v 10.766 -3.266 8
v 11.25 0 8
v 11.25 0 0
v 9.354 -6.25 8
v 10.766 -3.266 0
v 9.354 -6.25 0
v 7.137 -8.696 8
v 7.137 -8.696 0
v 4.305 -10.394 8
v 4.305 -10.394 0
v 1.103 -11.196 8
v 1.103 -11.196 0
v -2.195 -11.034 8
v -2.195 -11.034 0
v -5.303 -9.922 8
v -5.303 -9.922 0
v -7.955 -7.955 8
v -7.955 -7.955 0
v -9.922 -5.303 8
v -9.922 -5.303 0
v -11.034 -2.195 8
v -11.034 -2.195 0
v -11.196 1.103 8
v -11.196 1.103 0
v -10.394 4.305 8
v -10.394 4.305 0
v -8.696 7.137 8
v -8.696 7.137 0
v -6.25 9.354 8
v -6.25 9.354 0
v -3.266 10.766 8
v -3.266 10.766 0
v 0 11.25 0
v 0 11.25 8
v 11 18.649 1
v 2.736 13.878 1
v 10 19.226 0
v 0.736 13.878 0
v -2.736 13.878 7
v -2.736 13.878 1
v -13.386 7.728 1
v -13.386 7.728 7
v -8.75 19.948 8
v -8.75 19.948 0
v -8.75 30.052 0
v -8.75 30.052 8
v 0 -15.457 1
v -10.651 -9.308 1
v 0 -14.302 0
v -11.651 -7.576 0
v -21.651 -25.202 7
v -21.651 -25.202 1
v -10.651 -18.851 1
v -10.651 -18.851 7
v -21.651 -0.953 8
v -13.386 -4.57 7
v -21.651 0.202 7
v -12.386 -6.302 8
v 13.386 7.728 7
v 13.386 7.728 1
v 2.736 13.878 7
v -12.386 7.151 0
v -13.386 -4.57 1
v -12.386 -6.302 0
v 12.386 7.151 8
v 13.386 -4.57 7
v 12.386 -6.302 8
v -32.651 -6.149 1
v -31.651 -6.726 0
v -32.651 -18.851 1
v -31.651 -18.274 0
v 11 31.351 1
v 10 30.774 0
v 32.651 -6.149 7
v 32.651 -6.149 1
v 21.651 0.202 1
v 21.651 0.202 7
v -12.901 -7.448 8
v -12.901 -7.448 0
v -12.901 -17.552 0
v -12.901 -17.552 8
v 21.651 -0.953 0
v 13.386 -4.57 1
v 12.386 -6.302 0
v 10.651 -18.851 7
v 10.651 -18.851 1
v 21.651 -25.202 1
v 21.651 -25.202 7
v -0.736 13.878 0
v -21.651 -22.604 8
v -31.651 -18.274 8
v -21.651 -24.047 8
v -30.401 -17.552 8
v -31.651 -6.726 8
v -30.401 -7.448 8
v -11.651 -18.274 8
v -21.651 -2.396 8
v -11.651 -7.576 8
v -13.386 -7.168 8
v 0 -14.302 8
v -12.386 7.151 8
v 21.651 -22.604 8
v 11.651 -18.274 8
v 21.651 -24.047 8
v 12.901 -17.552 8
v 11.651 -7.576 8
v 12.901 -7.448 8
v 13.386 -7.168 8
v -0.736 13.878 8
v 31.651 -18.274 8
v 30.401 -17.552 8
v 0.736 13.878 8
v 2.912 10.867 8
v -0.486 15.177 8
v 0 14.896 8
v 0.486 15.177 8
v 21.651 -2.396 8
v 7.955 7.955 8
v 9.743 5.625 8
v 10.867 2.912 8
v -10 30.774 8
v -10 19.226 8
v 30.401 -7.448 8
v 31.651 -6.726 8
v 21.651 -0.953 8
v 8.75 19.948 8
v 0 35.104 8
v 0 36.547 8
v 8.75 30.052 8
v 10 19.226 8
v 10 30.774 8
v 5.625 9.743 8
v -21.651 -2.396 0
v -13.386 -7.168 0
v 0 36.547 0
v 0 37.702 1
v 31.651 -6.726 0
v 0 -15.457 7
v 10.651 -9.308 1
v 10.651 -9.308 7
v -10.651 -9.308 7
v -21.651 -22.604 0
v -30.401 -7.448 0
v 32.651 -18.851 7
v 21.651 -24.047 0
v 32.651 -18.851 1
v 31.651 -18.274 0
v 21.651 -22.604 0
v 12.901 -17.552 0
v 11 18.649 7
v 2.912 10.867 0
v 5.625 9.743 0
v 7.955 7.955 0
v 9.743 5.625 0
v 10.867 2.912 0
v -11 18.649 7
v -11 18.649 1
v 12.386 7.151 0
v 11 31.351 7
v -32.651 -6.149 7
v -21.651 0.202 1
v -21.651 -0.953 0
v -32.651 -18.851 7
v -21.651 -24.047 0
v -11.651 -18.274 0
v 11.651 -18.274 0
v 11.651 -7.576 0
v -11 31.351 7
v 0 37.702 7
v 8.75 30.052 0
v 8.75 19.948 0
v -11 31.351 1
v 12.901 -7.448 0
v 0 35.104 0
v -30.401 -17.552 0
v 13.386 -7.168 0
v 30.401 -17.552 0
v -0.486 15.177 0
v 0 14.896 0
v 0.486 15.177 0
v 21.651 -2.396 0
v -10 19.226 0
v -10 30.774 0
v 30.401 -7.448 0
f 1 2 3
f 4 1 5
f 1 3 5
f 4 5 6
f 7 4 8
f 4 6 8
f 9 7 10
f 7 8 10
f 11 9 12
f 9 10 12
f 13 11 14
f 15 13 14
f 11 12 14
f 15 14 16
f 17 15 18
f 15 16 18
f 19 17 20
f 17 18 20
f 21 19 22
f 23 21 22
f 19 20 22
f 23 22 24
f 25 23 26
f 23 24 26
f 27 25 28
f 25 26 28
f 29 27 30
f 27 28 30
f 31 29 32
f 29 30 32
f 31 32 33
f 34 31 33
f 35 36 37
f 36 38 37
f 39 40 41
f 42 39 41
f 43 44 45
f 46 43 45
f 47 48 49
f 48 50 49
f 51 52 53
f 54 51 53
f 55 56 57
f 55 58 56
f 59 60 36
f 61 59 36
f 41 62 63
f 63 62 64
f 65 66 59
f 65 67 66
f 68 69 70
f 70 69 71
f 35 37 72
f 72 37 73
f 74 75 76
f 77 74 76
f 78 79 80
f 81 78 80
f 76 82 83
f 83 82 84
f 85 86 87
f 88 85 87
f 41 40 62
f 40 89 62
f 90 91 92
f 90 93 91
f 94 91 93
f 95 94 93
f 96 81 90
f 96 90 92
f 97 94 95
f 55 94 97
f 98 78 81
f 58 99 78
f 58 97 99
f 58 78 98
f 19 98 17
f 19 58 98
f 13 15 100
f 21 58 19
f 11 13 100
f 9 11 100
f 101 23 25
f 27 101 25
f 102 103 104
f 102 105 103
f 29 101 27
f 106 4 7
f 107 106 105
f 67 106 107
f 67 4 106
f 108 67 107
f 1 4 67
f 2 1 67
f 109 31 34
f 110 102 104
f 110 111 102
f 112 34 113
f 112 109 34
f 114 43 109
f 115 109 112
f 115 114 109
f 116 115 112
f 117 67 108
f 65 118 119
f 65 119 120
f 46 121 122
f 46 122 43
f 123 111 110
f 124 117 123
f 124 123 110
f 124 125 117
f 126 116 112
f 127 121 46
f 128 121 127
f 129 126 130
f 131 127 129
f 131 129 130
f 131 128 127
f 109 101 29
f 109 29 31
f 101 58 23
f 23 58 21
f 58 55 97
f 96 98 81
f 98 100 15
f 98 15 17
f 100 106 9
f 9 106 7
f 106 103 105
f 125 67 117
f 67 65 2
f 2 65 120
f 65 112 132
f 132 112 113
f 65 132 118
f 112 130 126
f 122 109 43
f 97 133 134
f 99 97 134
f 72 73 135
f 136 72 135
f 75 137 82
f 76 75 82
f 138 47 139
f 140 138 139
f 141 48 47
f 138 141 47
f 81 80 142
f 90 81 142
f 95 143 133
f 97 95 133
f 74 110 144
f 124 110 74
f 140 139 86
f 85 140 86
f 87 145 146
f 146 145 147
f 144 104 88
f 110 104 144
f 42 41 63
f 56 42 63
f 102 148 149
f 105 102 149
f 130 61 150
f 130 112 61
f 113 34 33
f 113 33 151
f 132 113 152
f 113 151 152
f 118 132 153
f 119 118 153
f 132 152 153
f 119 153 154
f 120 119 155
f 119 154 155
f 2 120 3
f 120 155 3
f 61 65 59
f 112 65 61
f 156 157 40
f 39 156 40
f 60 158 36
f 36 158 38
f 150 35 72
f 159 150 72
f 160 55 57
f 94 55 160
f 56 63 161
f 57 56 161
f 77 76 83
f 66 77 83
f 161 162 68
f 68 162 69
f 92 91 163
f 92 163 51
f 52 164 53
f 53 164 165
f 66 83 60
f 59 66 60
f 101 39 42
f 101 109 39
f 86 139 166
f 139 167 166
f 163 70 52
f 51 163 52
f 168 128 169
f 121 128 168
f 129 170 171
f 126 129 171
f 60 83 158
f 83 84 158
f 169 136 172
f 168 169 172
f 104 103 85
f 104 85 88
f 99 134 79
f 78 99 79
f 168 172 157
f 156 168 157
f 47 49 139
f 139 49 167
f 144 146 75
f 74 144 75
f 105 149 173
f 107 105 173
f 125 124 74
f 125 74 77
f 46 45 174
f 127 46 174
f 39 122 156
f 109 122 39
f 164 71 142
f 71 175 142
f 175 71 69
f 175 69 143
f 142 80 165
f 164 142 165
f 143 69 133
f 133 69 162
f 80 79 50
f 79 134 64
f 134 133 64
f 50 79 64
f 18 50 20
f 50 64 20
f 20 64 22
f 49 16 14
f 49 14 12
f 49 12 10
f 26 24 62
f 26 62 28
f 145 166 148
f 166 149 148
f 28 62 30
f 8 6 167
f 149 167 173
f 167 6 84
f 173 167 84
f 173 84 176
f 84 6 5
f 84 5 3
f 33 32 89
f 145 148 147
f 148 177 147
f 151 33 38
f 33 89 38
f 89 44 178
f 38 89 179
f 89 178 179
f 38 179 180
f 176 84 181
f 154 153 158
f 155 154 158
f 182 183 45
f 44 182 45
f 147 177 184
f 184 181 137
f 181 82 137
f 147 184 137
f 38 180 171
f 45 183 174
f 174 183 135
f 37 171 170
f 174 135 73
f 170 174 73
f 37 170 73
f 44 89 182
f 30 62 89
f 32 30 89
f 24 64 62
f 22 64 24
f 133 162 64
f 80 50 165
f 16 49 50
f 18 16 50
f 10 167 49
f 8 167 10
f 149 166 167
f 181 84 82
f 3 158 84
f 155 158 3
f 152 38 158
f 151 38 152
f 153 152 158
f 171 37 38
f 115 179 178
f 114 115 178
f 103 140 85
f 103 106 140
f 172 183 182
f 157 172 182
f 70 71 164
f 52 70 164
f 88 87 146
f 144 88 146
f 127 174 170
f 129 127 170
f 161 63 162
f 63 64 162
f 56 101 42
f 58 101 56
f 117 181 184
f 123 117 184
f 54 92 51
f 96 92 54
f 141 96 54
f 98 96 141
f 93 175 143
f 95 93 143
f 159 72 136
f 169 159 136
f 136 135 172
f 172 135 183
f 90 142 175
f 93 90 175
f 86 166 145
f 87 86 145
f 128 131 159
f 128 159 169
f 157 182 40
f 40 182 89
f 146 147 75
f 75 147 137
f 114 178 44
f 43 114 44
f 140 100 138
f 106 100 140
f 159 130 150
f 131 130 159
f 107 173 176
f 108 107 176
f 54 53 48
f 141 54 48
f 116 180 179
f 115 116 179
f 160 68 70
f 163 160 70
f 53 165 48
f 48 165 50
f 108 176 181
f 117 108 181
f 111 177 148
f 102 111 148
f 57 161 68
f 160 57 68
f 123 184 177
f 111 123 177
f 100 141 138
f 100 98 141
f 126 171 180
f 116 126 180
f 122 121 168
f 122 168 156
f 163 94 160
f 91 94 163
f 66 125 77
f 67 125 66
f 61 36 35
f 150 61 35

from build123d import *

# Parameters (mm, degrees)
F1_DEPTH = 8
F2_SIZE  = 1


# Not quite as in the source:
# - a feature names something its author has since deleted; it is built from what else it names


with BuildPart() as f1:
    # F0 (on Top) → F1 (new body)
    with BuildSketch(Plane.XY):
        Polygon((2.7355143452, 13.8776440214), (0, 12.2982940778), (-2.7355143452, 13.8776440214), (-13.3861494398, 7.7284969825), (-13.3861494398, -4.5697970953), (-10.6506350946, -6.1491470389), (-10.6506350946, -9.3078469261), (0, -15.456993965), (10.6506350946, -9.3078469261), (10.6506350946, -6.1491470389), (13.3861494398, -4.5697970953), (13.3861494398, 7.7284969825), align=None)
        with BuildLine():
            ThreePointArc((0, 11.25), (7.9549512883, 7.9549512883), (11.25, 0))
            ThreePointArc((11.25, 0), (-7.9549512883, -7.9549512883), (0, 11.25))
        make_face(mode=Mode.SUBTRACT)
        Polygon((-2.7355143452, 13.8776440214), (0, 12.2982940778), (0, 14.8963702892), (-0.4855143452, 15.1766821271), align=None)
        Polygon((0, 14.8963702892), (0, 12.2982940778), (2.7355143452, 13.8776440214), (0.4855143452, 15.1766821271), align=None)
        Polygon((-11, 18.6491470389), (-2.7355143452, 13.8776440214), (-0.4855143452, 15.1766821271), (-8.75, 19.9481851446), (-8.75, 30.0518148554), (0, 35.1036297108), (8.75, 30.0518148554), (8.75, 19.9481851446), (0.4855143452, 15.1766821271), (2.7355143452, 13.8776440214), (11, 18.6491470389), (11, 31.3508529611), (0, 37.7017059222), (-11, 31.3508529611), align=None)
        Polygon((-13.3861494398, -7.1678733067), (-13.3861494398, -4.5697970953), (-21.6506350946, 0.2017059222), (-32.6506350946, -6.1491470389), (-32.6506350946, -18.8508529611), (-21.6506350946, -25.2017059222), (-10.6506350946, -18.8508529611), (-10.6506350946, -9.3078469261), (-12.9006350946, -8.0088088204), (-12.9006350946, -17.5518148554), (-21.6506350946, -22.6036297108), (-30.4006350946, -17.5518148554), (-30.4006350946, -7.4481851446), (-21.6506350946, -2.3963702892), align=None)
        Polygon((-10.6506350946, -6.1491470389), (-13.3861494398, -4.5697970953), (-13.3861494398, -7.1678733067), (-12.9006350946, -7.4481851446), (-12.9006350946, -8.0088088204), (-10.6506350946, -9.3078469261), align=None)
        Polygon((13.3861494398, -7.1678733067), (13.3861494398, -4.5697970953), (10.6506350946, -6.1491470389), (10.6506350946, -9.3078469261), (12.9006350946, -8.0088088204), (12.9006350946, -7.4481851446), align=None)
        Polygon((21.6506350946, 0.2017059222), (13.3861494398, -4.5697970953), (13.3861494398, -7.1678733067), (21.6506350946, -2.3963702892), (30.4006350946, -7.4481851446), (30.4006350946, -17.5518148554), (21.6506350946, -22.6036297108), (12.9006350946, -17.5518148554), (12.9006350946, -8.0088088204), (10.6506350946, -9.3078469261), (10.6506350946, -18.8508529611), (21.6506350946, -25.2017059222), (32.6506350946, -18.8508529611), (32.6506350946, -6.1491470389), align=None)
    extrude(amount=F1_DEPTH)

    # F2
    f2_edges = [f1.edges().sort_by_distance(p)[0] for p in [
        (-8.060832, 10.803071, 8),
        (-13.386149, 1.57935, 8),
        (-17.518392, -2.184046, 8),
        (-27.150635, -2.973721, 8),
        (-32.650635, -12.5, 8),
        (-27.150635, -22.026279, 8),
        (-16.150635, -22.026279, 8),
        (-5.325318, -12.38242, 8),
        (-10.650635, -14.07935, 8),
        (5.325318, -12.38242, 8),
        (10.650635, -14.07935, 8),
        (16.150635, -22.026279, 8),
        (27.150635, -22.026279, 8),
        (32.650635, -12.5, 8),
        (27.150635, -2.973721, 8),
        (17.518392, -2.184046, 8),
        (13.386149, 1.57935, 8),
        (8.060832, 10.803071, 8),
        (6.867757, 16.263396, 8),
        (11, 25, 8),
        (5.5, 34.526279, 8),
        (-5.5, 34.526279, 8),
        (-11, 25, 8),
        (-6.867757, 16.263396, 8),
        (-11, 25, 0),
        (-5.5, 34.526279, 0),
        (5.5, 34.526279, 0),
        (11, 25, 0),
        (6.867757, 16.263396, 0),
        (-6.867757, 16.263396, 0),
        (-8.060832, 10.803071, 0),
        (8.060832, 10.803071, 0),
        (13.386149, 1.57935, 0),
        (-13.386149, 1.57935, 0),
        (17.518392, -2.184046, 0),
        (27.150635, -2.973721, 0),
        (32.650635, -12.5, 0),
        (27.150635, -22.026279, 0),
        (16.150635, -22.026279, 0),
        (10.650635, -14.07935, 0),
        (5.325318, -12.38242, 0),
        (-5.325318, -12.38242, 0),
        (-10.650635, -14.07935, 0),
        (-16.150635, -22.026279, 0),
        (-27.150635, -22.026279, 0),
        (-32.650635, -12.5, 0),
        (-27.150635, -2.973721, 0),
        (-17.518392, -2.184046, 0),
    ]]
    chamfer(f2_edges, length=F2_SIZE)


solid = f1.part
